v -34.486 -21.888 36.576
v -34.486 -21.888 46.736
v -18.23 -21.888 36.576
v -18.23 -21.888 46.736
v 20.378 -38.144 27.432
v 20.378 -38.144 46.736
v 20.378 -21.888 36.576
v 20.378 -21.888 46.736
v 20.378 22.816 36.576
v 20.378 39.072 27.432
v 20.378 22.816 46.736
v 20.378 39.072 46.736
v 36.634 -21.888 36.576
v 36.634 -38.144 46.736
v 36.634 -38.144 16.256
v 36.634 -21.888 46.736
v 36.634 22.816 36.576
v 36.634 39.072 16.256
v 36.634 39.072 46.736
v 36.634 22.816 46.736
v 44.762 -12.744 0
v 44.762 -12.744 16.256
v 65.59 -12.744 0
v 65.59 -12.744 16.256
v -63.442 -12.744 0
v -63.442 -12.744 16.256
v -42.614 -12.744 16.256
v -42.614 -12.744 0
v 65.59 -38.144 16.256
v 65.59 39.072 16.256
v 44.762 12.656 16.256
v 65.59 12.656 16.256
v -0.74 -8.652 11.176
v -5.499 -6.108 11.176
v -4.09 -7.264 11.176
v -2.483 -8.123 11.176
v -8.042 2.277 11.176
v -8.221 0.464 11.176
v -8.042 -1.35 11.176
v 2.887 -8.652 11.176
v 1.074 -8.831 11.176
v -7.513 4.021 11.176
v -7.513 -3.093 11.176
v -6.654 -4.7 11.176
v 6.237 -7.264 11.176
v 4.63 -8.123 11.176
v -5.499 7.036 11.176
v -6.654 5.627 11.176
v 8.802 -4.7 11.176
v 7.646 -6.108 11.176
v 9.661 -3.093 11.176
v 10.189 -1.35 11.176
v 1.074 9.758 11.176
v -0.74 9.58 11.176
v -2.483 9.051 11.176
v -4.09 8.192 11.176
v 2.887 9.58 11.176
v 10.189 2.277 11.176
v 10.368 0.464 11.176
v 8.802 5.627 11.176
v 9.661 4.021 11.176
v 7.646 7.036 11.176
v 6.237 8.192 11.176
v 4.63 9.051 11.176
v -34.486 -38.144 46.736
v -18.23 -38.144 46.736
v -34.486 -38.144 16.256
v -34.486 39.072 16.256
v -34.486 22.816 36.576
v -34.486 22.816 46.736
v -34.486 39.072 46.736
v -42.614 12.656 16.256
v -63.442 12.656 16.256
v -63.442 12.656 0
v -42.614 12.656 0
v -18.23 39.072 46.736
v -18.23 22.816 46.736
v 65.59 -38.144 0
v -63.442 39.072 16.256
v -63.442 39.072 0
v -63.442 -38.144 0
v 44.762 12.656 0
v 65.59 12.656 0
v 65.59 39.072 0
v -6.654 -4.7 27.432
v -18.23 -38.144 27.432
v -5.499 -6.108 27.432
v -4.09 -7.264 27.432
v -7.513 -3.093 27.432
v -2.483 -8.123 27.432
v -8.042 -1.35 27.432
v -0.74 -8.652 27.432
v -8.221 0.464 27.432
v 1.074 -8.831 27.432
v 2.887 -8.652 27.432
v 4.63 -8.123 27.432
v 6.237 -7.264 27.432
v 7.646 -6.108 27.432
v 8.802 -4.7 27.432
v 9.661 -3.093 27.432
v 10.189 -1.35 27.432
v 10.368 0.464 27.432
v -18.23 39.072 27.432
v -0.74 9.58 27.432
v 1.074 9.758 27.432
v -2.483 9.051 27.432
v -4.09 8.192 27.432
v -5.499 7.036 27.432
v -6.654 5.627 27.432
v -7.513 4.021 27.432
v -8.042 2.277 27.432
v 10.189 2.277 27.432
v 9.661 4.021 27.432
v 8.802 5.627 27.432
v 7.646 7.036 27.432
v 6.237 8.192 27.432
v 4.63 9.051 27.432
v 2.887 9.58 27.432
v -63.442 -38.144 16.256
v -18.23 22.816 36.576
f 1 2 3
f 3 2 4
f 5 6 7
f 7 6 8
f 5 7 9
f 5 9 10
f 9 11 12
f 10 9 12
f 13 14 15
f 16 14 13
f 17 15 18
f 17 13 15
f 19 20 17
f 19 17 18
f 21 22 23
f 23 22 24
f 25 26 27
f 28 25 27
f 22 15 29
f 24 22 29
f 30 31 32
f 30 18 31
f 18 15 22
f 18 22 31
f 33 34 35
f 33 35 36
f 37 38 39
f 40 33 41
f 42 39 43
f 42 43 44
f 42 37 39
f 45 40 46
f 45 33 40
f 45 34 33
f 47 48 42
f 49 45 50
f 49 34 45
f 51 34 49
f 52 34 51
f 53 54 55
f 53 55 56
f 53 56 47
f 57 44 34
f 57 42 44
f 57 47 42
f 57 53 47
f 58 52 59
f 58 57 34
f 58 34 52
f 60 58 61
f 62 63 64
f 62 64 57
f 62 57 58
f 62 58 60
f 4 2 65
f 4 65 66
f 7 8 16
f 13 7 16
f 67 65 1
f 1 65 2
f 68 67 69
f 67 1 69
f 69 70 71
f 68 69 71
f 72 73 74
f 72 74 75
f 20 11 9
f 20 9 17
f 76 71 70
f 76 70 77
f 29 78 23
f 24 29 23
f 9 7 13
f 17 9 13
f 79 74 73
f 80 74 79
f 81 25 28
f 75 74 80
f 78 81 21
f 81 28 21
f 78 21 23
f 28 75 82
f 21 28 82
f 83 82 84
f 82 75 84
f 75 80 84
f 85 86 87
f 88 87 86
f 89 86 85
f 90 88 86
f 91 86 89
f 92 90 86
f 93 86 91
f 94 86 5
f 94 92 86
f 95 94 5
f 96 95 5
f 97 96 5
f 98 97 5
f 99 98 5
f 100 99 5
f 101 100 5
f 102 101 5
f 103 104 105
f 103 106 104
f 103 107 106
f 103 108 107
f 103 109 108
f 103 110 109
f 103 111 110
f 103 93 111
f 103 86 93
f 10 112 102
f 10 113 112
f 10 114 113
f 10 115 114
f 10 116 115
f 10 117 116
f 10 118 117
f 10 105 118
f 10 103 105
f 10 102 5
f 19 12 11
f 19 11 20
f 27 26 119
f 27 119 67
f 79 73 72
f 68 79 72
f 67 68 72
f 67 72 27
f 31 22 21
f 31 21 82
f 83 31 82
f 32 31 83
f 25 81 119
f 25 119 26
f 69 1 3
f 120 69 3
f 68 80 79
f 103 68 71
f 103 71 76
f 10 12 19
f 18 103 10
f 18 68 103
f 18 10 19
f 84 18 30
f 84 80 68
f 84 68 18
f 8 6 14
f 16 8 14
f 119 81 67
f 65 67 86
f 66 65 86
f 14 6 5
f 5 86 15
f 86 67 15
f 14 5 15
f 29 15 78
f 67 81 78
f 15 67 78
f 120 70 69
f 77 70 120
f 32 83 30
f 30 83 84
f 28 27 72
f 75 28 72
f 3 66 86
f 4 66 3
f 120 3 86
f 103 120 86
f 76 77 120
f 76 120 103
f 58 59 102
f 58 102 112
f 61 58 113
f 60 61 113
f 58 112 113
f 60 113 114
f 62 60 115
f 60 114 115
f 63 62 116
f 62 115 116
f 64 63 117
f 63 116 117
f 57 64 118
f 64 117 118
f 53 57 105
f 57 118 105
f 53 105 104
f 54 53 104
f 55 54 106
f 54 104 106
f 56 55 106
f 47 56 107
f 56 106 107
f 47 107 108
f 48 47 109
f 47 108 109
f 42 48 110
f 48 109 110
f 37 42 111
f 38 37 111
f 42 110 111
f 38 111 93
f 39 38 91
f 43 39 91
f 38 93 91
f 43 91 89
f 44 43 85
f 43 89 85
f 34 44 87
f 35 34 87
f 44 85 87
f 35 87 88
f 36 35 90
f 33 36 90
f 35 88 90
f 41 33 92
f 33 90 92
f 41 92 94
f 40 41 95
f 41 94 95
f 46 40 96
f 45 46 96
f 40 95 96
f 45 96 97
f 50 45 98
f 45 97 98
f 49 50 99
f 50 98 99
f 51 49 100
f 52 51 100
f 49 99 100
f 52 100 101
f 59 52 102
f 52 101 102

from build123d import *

# Parameters (mm, degrees)
F0_W      = 129.032
F0_H      = 77.216
F1_DEPTH  = 46.736
F2_W      = 28.956
F2_H      = 77.216
F3_DEPTH  = 30.48
F4_DEPTH  = 30.48
F5_W      = 38.608
F5_H      = 77.216
F6_DEPTH  = 19.304
F7_W      = 16.256
F7_H      = 44.704
F8_DEPTH  = 10.16
F9_W      = 16.256
F9_H      = 44.704
F10_DEPTH = 10.16
F11_W     = 20.828
F11_H     = 25.4
F12_DEPTH = 16.256
F13_W     = 20.828
F13_H     = 25.4
F14_DEPTH = 16.256
F15_R     = 9.294424
F16_DEPTH = 16.256


with BuildPart() as f1:
    # F0 (on Top) → F1 (new body)
    with BuildSketch(Plane.XY):
        with Locations((1.073599, 0.463698)):
            Rectangle(F0_W, F0_H)
    extrude(amount=F1_DEPTH)

    # F2 (on face) → F3 (cut)
    with BuildSketch(Plane.XY.offset(46.736)):
        with Locations((-48.964401, 0.463698)):
            Rectangle(F2_W, F2_H)
    extrude(amount=-F3_DEPTH, mode=Mode.SUBTRACT)

    # F2 (on face) → F4 (cut)
    with BuildSketch(Plane.XY.offset(46.736)):
        with Locations((51.111599, 0.463698)):
            Rectangle(F2_W, F2_H)
    extrude(amount=-F4_DEPTH, mode=Mode.SUBTRACT)

    # F5 (on face) → F6 (cut)
    with BuildSketch(Plane.XY.offset(46.736)):
        with Locations((1.073599, 0.463698)):
            Rectangle(F5_W, F5_H)
    extrude(amount=-F6_DEPTH, mode=Mode.SUBTRACT)

    # F7 (on face) → F8 (cut)
    with BuildSketch(Plane.XY.offset(46.736)):
        with Locations((-26.358401, 0.463698)):
            Rectangle(F7_W, F7_H)
    extrude(amount=-F8_DEPTH, mode=Mode.SUBTRACT)

    # F9 (on face) → F10 (cut)
    with BuildSketch(Plane.XY.offset(46.736)):
        with Locations((28.505599, 0.463698)):
            Rectangle(F9_W, F9_H)
    extrude(amount=-F10_DEPTH, mode=Mode.SUBTRACT)

    # F11 (on face) → F12 (cut)
    with BuildSketch(Plane.XY.offset(16.256)):
        with Locations((55.175599, -0.044302)):
            Rectangle(F11_W, F11_H)
    extrude(amount=-F12_DEPTH, mode=Mode.SUBTRACT)

    # F13 (on face) → F14 (cut)
    with BuildSketch(Plane.XY.offset(16.256)):
        with Locations((-53.028401, -0.044302)):
            Rectangle(F13_W, F13_H)
    extrude(amount=-F14_DEPTH, mode=Mode.SUBTRACT)

    # F15 (on face) → F16 (cut)
    with BuildSketch(Plane.XY.offset(27.432)):
        with Locations((1.073599, 0.463698)):
            Circle(F15_R)
    extrude(amount=-F16_DEPTH, mode=Mode.SUBTRACT)


solid = f1.part
